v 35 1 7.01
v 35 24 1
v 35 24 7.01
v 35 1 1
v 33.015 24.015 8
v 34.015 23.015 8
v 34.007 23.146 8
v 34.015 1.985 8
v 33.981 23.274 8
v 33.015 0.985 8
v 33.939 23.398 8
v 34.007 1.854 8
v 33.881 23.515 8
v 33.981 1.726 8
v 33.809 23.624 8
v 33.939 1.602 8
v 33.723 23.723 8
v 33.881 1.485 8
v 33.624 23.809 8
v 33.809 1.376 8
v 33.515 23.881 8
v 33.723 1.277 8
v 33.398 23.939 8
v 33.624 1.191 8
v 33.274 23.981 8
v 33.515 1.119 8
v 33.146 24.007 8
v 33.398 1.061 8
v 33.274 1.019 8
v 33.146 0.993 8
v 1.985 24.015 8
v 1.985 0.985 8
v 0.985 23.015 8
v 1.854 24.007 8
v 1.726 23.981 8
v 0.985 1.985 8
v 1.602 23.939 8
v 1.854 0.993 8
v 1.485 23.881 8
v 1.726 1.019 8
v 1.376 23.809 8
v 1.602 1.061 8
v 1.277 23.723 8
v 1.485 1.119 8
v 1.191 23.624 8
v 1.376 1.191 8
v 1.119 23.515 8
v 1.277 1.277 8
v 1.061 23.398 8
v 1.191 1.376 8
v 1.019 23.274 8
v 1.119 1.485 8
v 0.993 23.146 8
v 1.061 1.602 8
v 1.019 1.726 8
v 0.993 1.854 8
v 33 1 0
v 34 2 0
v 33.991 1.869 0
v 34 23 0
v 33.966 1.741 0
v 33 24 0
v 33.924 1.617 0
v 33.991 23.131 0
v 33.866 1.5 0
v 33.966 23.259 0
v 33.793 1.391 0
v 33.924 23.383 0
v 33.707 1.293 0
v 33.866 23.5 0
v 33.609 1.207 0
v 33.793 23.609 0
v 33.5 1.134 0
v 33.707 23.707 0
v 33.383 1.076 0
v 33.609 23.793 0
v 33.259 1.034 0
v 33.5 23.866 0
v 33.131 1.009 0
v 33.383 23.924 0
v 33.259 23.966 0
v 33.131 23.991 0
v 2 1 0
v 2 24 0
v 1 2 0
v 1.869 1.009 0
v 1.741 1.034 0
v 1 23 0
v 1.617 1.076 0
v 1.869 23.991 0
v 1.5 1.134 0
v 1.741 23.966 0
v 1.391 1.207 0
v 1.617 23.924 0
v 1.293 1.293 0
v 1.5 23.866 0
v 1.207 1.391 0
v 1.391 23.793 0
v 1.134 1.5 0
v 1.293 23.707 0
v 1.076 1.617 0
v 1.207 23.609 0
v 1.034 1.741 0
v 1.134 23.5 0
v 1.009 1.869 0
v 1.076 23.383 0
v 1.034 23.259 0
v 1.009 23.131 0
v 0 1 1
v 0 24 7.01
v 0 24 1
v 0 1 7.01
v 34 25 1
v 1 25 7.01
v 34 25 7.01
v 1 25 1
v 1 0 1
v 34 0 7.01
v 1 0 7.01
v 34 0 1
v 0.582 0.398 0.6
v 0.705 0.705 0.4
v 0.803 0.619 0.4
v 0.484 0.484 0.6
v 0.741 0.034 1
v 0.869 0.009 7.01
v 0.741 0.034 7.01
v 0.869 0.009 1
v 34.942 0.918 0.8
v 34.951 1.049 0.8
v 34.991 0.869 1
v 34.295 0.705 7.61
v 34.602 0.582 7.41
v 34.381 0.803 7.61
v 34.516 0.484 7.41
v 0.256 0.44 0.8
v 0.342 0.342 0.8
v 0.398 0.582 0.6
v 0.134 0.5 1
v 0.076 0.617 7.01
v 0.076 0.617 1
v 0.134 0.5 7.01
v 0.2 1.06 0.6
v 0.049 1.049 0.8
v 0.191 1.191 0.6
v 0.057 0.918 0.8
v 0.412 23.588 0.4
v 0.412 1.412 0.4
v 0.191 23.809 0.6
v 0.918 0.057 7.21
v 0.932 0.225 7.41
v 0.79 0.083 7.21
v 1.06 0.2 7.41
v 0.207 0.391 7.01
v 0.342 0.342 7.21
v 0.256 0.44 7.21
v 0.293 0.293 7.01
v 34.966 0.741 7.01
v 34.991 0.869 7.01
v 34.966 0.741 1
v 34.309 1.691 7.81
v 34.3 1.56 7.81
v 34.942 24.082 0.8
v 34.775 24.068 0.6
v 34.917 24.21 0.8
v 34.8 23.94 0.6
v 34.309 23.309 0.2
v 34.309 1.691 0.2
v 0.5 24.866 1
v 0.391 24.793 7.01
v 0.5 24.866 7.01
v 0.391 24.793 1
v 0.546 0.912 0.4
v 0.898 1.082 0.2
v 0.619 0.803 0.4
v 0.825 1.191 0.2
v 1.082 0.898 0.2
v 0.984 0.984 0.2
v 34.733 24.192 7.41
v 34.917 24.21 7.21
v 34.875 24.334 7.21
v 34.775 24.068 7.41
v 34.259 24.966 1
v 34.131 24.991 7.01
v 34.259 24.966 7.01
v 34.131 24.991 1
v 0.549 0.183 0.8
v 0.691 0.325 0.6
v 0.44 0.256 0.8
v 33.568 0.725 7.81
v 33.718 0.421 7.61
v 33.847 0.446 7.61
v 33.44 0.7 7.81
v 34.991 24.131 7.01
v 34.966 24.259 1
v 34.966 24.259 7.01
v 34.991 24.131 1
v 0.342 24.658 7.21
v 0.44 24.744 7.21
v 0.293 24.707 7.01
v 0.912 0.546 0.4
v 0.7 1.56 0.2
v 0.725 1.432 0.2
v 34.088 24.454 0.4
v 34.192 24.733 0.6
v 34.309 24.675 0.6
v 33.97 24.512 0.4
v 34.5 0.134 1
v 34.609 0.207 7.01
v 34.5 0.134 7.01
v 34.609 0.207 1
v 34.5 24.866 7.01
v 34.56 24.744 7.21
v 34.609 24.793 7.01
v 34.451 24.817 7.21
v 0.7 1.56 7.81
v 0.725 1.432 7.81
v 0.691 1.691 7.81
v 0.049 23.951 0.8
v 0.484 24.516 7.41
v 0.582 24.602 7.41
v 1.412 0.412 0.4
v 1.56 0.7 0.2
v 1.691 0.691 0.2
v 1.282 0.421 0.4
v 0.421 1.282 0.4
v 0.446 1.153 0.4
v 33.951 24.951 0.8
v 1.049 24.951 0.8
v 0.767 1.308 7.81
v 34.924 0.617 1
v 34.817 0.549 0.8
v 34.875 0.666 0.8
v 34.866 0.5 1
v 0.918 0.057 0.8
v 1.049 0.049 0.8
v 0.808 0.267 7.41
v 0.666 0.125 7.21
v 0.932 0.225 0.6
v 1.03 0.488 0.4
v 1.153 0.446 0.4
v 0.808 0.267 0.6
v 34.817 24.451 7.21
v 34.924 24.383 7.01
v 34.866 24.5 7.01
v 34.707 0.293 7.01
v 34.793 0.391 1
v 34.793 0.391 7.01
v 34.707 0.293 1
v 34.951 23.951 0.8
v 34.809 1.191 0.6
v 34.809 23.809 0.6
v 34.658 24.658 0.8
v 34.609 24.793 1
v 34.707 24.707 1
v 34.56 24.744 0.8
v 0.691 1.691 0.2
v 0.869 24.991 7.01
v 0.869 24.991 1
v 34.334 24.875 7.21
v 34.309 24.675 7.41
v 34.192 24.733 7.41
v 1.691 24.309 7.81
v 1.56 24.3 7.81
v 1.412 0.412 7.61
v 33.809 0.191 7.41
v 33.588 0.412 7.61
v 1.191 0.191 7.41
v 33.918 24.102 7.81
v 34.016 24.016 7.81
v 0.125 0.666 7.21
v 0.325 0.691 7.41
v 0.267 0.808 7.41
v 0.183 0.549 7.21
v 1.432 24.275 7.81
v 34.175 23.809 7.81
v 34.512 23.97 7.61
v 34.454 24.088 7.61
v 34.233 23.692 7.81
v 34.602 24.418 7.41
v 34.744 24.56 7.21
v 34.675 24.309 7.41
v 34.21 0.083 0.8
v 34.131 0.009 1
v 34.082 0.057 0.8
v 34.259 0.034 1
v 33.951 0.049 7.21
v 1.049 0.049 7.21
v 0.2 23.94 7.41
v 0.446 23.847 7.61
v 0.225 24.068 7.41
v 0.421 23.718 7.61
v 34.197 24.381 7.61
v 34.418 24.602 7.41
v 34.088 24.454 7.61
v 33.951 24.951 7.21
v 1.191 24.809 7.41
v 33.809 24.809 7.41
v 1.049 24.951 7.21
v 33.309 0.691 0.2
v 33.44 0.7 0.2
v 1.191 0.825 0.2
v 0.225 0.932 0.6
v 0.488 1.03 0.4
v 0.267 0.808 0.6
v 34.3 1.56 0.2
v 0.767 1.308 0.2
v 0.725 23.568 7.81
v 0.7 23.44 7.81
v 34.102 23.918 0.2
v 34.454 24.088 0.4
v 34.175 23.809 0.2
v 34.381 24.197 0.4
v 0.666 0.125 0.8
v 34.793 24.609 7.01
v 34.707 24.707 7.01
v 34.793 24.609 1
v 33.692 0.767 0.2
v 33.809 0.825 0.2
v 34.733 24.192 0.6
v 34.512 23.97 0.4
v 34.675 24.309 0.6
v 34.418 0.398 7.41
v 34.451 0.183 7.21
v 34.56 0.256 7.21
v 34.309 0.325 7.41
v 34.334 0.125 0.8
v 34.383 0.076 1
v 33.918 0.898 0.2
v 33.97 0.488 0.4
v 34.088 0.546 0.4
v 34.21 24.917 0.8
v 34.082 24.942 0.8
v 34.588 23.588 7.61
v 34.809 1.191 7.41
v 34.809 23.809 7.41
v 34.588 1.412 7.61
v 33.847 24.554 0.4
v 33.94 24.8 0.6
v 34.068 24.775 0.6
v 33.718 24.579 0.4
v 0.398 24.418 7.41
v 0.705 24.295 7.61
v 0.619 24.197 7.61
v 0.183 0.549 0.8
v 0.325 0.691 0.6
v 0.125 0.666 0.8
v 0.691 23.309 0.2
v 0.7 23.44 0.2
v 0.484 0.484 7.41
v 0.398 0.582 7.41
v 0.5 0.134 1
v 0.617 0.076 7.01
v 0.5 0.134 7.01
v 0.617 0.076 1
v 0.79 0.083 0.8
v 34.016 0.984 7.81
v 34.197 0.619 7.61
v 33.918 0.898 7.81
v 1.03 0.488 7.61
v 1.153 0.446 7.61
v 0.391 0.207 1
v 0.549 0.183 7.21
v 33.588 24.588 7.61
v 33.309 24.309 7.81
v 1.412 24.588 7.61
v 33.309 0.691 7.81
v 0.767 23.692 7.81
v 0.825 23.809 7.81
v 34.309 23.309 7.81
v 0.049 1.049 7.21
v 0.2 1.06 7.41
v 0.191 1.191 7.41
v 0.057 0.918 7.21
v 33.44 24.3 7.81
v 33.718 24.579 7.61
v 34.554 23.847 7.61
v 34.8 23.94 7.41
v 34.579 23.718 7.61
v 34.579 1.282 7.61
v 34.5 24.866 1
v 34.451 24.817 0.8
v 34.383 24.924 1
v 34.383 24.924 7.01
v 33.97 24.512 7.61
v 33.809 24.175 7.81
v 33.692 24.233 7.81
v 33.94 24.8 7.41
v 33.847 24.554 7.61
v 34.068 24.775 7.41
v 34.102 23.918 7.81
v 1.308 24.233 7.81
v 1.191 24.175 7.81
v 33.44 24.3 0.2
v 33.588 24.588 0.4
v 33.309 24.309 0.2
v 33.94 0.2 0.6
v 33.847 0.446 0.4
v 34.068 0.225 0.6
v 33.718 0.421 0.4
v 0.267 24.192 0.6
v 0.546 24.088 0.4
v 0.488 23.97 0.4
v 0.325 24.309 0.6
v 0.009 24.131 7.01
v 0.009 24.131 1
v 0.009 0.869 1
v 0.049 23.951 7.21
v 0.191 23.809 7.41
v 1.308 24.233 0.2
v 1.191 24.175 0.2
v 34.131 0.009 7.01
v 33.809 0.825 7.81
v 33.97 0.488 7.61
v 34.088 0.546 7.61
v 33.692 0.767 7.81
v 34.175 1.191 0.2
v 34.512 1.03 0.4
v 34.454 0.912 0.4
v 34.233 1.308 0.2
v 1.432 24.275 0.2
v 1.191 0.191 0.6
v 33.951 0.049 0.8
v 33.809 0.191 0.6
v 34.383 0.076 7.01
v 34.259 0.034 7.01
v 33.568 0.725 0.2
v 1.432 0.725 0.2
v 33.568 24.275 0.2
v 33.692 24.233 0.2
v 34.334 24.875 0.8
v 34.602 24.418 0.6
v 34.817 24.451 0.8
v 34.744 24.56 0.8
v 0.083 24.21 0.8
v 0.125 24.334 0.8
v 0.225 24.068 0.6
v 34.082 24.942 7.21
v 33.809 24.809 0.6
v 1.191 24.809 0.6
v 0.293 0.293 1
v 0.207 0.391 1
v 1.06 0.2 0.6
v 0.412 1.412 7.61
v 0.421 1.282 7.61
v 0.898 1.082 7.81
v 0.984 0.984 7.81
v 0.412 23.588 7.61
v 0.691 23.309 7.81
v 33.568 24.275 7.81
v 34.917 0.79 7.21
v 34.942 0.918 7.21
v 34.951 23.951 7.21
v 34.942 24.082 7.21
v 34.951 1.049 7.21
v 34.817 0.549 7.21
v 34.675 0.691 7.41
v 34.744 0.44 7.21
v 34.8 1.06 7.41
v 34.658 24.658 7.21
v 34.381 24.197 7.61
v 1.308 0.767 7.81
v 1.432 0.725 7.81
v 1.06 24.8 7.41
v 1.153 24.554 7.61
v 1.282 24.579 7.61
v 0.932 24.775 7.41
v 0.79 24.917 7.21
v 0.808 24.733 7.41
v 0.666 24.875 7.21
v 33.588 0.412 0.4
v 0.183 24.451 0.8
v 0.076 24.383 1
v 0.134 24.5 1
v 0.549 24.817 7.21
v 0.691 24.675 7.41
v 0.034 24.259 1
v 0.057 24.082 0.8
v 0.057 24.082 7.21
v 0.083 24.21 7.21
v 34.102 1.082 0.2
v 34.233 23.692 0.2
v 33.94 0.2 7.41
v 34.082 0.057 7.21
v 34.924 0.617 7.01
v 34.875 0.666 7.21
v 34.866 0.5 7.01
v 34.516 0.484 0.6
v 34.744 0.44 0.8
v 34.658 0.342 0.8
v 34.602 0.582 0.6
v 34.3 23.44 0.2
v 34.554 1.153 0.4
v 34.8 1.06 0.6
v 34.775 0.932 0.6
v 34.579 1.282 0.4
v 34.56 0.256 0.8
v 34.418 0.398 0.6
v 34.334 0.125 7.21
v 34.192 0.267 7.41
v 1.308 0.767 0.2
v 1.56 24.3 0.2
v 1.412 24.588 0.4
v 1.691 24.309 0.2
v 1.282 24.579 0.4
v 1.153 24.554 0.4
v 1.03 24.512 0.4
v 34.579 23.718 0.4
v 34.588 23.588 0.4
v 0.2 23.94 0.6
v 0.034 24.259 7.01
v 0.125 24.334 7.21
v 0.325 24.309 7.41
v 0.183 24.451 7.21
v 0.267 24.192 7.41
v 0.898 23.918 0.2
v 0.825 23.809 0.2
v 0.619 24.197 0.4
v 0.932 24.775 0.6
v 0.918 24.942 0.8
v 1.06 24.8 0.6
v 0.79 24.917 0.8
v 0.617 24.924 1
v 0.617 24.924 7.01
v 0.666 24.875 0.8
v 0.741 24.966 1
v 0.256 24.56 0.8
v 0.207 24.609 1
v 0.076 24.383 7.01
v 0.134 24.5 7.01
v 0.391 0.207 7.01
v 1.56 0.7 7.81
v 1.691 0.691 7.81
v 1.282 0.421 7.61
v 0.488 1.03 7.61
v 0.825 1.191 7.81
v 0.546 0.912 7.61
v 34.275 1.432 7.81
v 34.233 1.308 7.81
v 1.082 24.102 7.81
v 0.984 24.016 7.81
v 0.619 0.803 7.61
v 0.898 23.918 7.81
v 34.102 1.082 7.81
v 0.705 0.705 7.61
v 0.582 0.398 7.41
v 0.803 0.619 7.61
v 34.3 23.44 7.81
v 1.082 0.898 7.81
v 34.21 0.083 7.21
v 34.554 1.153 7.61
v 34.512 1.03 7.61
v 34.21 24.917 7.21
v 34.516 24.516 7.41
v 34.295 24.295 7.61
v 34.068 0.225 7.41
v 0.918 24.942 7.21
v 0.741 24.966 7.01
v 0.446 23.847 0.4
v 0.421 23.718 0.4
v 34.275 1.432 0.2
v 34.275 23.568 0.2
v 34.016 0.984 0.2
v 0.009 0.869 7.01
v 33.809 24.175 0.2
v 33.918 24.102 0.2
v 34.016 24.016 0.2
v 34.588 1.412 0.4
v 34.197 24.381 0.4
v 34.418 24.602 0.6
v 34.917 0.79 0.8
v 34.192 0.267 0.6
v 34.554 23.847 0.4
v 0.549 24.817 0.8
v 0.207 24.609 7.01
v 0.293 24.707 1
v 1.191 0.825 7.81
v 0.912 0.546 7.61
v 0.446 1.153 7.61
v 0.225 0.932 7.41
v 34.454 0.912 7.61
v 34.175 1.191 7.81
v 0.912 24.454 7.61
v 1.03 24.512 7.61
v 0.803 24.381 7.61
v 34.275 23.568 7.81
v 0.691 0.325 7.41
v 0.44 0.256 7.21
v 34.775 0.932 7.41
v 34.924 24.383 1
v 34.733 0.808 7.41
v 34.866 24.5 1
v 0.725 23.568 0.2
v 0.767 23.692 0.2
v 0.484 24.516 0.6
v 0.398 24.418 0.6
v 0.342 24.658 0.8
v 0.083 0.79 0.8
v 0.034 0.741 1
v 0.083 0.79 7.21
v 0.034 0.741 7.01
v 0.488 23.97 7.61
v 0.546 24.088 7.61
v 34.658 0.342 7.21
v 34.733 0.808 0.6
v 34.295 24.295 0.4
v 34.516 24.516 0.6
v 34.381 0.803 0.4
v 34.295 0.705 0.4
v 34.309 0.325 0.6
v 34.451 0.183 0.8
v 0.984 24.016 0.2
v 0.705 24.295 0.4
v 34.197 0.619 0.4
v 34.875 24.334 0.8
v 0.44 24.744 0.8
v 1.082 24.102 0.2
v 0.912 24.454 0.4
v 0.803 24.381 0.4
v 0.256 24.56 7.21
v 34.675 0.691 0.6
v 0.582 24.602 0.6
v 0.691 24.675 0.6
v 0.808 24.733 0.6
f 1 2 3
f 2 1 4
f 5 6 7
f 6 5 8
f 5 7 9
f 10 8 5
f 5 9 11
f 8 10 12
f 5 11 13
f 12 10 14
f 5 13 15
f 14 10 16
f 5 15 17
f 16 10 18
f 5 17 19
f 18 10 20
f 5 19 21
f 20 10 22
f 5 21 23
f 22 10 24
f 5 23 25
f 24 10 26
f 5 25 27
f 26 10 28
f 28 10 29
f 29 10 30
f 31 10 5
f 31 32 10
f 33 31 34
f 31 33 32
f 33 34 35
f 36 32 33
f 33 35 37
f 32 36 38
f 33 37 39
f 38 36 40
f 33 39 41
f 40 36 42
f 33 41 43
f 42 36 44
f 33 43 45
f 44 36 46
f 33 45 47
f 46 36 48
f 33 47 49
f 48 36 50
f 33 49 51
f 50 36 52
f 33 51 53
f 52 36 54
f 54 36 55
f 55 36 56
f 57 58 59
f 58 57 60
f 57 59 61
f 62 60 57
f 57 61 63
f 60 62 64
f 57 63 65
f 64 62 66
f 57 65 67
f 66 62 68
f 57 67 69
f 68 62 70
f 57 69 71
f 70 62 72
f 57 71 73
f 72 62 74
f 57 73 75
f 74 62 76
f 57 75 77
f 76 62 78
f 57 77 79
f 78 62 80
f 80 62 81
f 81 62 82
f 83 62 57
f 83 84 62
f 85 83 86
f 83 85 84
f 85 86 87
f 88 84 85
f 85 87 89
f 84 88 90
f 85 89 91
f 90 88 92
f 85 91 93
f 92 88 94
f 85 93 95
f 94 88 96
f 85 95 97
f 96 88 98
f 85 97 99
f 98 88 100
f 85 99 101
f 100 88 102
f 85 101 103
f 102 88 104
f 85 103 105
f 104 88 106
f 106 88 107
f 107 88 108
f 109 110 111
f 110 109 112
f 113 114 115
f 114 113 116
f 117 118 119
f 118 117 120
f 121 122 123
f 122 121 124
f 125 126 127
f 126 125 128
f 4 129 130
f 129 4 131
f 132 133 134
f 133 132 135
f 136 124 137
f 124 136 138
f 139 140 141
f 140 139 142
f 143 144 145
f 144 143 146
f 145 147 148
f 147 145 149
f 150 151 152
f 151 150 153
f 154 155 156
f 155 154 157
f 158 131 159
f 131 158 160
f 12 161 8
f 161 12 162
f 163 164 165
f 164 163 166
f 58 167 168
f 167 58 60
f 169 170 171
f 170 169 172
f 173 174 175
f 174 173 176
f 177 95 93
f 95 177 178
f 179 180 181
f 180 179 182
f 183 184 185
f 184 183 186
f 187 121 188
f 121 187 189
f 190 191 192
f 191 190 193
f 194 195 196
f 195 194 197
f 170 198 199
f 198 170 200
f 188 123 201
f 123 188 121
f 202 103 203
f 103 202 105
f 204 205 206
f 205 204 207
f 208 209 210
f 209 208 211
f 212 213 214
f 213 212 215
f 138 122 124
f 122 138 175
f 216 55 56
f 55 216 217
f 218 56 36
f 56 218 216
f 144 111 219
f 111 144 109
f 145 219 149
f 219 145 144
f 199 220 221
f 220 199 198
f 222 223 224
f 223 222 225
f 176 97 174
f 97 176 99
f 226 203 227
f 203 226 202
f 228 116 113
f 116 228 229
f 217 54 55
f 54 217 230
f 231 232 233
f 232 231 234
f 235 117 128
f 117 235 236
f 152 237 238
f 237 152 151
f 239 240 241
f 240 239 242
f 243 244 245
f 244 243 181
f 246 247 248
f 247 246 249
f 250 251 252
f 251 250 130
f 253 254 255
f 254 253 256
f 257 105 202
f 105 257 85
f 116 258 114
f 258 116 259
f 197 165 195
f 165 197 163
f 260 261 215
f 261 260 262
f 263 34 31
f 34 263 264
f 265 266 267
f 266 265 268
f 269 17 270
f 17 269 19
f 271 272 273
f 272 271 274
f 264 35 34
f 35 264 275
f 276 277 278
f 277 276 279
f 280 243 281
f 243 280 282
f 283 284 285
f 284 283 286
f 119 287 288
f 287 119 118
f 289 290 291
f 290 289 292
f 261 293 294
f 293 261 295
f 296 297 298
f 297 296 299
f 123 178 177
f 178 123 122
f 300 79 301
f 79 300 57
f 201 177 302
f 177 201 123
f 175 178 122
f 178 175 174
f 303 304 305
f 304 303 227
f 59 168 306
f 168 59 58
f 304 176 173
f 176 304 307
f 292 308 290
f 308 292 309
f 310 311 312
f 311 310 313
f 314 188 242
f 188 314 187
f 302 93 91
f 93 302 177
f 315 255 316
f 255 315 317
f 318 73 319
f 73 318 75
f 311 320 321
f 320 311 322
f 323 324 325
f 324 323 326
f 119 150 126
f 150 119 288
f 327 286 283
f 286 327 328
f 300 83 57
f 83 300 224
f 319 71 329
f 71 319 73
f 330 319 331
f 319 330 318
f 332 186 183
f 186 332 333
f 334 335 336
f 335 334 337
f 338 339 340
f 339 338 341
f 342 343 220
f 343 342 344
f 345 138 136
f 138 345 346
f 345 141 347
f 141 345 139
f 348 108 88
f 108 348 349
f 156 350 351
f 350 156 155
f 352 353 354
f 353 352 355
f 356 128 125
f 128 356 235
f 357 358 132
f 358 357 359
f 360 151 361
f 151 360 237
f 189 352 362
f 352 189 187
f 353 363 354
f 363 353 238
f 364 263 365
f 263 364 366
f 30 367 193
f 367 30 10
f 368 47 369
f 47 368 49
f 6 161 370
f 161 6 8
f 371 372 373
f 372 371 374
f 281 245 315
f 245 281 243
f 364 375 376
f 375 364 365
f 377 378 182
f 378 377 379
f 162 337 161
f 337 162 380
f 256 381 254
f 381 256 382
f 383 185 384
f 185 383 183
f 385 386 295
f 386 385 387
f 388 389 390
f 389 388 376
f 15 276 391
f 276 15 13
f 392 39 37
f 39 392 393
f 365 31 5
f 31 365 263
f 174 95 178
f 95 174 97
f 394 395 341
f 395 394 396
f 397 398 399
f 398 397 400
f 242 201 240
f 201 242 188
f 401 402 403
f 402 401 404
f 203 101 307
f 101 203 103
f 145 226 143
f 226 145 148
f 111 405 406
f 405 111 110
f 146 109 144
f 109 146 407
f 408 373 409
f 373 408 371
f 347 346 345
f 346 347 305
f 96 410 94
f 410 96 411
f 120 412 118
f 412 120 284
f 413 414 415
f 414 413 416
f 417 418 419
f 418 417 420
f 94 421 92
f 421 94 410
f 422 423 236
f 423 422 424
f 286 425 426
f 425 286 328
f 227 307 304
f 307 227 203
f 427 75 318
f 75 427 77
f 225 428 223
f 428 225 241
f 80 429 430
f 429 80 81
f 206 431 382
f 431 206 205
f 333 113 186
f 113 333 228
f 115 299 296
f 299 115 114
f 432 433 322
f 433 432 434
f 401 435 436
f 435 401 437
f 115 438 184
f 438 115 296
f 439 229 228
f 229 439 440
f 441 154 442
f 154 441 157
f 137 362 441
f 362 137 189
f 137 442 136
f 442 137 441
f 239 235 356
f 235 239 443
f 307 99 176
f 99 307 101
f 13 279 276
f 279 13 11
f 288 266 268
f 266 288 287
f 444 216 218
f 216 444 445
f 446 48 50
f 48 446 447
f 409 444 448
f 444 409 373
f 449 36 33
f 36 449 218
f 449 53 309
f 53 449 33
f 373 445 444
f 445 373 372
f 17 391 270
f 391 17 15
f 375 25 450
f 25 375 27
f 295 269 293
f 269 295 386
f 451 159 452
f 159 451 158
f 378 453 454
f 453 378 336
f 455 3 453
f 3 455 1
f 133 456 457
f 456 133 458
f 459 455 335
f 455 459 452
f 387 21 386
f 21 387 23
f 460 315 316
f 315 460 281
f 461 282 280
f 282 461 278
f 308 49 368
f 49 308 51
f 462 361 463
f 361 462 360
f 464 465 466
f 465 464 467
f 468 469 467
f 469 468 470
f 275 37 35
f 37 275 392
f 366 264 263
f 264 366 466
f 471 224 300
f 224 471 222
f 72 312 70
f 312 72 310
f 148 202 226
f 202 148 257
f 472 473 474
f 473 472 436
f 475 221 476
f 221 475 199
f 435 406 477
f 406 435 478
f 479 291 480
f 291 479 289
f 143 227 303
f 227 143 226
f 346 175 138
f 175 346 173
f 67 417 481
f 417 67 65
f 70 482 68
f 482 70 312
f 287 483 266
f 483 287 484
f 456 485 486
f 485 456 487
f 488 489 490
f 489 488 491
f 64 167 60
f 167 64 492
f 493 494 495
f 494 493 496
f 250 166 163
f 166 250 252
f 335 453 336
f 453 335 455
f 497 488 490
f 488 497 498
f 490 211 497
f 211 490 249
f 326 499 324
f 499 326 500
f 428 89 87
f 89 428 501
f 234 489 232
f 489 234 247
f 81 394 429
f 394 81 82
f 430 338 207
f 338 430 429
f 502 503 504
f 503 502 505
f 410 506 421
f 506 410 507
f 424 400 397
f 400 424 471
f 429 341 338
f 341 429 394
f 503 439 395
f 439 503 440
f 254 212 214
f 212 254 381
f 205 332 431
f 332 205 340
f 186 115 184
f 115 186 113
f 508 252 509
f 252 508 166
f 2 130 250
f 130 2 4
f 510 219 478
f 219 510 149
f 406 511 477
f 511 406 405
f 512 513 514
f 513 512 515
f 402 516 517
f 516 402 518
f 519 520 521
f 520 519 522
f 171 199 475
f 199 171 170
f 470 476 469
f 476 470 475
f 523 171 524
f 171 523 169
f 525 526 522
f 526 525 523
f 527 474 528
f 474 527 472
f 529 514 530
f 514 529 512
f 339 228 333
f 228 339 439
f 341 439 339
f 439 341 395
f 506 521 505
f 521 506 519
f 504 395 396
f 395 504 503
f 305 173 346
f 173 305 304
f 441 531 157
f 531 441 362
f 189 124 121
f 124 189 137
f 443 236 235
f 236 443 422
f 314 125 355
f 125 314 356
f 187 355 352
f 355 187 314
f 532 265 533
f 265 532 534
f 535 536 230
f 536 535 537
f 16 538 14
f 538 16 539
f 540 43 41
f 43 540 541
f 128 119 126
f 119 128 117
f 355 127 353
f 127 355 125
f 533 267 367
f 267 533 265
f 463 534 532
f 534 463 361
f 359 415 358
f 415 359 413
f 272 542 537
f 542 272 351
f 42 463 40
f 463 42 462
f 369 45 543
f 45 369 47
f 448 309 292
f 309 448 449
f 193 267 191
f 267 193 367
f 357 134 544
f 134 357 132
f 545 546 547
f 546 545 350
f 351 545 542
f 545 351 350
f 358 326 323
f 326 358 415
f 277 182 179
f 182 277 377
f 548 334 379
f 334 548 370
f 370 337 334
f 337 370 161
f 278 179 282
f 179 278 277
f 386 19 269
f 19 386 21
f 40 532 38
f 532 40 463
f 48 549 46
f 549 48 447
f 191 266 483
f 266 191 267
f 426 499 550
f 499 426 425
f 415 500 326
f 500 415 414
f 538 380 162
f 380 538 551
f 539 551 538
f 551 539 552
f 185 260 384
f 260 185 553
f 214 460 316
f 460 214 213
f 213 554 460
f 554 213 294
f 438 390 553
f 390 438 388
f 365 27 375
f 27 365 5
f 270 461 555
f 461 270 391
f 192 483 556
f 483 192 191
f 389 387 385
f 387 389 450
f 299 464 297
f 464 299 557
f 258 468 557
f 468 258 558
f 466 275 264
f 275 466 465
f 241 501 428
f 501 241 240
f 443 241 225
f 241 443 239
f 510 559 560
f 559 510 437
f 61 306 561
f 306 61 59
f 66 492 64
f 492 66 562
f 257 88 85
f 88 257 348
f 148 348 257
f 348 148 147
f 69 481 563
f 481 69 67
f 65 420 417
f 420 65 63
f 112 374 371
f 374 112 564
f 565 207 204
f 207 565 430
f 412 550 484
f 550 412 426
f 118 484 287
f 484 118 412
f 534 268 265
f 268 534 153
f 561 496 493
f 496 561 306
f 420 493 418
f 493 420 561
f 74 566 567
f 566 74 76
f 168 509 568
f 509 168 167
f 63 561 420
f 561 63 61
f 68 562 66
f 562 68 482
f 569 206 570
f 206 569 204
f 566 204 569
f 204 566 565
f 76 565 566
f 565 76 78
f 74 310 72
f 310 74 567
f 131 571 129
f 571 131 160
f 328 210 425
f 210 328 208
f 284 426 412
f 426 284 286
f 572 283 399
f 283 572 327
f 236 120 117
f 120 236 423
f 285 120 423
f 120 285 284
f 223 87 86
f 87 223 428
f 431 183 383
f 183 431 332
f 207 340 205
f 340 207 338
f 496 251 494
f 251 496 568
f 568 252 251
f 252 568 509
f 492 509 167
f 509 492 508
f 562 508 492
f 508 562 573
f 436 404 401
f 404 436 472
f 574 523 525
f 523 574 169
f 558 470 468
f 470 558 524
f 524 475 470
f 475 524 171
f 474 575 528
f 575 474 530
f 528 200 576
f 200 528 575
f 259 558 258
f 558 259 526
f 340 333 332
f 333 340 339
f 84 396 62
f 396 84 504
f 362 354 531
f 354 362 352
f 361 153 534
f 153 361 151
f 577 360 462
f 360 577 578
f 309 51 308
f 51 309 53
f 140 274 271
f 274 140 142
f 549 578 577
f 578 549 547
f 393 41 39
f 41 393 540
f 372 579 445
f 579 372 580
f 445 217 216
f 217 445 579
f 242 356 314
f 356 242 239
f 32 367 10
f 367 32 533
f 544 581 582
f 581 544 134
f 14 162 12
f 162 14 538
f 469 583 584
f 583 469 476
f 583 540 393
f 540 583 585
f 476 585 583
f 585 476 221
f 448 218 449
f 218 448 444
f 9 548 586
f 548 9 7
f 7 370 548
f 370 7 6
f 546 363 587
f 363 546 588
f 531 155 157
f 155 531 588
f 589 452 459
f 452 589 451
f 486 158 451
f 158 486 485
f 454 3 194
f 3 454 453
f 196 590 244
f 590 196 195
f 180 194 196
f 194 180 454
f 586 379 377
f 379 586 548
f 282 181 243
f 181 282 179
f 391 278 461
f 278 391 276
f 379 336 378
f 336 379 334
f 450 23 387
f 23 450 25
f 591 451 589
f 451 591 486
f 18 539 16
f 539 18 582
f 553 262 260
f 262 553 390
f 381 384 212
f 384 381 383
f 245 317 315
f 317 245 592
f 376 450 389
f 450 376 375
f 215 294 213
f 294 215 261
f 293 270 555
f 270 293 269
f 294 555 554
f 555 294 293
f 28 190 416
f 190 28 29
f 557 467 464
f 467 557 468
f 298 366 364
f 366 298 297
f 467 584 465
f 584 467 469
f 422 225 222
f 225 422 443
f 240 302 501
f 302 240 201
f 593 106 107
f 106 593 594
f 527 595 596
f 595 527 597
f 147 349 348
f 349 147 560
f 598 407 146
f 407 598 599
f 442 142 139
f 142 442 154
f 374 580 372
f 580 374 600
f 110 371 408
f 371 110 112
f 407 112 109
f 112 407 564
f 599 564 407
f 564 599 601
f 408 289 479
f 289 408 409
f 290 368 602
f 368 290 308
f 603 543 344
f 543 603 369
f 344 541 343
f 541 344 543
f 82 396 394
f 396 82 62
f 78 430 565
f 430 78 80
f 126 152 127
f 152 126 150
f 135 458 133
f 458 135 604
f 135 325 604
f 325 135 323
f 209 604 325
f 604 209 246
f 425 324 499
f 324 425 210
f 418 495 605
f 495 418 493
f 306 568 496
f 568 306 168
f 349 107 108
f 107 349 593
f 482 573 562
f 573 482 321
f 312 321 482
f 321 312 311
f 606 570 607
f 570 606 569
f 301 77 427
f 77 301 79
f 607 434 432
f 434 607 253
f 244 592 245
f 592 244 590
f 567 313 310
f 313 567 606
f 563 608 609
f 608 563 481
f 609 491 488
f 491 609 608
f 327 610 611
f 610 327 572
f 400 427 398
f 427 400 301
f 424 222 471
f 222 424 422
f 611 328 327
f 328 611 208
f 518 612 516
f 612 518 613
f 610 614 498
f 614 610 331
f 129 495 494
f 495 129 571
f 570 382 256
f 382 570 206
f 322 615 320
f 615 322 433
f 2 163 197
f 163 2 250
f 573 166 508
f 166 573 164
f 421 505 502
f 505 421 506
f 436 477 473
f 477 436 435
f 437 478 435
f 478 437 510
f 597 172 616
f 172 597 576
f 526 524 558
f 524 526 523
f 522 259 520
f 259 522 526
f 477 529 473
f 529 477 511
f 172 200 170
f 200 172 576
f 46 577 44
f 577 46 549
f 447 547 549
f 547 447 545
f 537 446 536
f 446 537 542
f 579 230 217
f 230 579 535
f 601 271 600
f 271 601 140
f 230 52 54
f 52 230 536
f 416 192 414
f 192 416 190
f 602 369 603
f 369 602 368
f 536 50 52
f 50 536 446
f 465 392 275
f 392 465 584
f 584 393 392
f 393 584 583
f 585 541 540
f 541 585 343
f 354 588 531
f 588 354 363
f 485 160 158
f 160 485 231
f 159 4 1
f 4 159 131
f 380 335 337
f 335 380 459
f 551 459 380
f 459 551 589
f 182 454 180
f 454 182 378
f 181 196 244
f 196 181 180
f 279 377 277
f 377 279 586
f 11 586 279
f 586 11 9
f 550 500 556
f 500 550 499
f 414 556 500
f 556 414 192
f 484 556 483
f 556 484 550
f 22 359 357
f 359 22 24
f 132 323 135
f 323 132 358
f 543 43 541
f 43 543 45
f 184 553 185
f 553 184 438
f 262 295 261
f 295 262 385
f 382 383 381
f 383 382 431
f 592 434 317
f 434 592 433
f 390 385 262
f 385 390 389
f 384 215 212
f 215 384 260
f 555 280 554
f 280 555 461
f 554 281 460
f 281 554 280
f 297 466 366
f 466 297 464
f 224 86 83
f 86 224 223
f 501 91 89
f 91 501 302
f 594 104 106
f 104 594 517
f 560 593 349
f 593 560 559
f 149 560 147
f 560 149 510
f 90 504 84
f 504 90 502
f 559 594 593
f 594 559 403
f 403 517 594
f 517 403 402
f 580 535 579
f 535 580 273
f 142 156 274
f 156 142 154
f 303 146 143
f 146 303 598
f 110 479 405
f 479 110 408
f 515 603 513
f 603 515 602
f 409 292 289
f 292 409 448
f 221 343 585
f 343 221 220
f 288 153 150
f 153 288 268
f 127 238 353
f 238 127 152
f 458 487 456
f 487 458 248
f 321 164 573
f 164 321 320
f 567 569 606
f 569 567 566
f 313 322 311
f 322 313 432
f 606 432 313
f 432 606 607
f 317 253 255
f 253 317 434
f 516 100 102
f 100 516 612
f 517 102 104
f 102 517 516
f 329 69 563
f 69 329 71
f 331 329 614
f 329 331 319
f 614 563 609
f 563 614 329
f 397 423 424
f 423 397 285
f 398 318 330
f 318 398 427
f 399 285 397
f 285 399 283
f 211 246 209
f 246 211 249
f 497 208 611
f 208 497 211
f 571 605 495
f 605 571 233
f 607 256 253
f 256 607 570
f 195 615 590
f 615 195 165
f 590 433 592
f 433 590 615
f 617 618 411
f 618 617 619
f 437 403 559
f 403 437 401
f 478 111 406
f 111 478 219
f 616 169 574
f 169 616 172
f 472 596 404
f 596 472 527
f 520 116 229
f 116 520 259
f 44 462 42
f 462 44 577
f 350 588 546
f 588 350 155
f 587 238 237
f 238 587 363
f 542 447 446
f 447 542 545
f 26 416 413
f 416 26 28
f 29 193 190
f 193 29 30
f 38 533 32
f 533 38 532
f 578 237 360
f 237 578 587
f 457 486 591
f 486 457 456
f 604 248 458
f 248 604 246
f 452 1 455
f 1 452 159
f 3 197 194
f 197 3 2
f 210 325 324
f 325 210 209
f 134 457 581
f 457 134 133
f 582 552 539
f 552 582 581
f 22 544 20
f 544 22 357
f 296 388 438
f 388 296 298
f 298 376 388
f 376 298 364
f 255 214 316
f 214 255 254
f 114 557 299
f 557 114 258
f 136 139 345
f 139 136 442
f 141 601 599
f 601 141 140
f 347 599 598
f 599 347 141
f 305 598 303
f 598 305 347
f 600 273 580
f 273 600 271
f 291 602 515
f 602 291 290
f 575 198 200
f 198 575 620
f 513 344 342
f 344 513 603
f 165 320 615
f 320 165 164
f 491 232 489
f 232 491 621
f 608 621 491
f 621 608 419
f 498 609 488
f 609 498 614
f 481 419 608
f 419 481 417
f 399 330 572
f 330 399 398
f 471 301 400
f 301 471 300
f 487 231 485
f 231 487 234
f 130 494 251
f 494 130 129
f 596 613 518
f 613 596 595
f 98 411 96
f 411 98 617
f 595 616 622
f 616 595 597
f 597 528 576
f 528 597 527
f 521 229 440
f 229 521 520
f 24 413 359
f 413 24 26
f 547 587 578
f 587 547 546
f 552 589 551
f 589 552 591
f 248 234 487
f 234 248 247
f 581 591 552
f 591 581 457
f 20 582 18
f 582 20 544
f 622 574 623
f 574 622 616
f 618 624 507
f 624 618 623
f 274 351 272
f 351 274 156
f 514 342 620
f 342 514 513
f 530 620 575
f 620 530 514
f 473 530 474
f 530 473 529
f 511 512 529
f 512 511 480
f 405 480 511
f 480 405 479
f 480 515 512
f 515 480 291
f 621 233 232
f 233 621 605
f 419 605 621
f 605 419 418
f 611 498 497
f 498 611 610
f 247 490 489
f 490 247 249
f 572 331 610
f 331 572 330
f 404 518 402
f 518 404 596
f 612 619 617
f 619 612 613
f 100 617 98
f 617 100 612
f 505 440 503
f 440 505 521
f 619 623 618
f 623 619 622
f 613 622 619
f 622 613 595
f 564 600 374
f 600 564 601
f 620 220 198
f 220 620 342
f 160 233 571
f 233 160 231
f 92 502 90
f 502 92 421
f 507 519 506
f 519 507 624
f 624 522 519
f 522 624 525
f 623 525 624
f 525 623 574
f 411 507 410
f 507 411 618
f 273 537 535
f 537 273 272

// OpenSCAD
// units=mm — generated by scad_emitter.py
// part=unnamed
$fn = 48;

intersection() { cube([35, 25, 8]); hull() { translate([2, 2, 0]) linear_extrude(height=0.01) offset(r=1) square([31, 21]); translate([1.691, 1.691, 0.2]) linear_extrude(height=0.01) offset(r=1) square([31.618, 21.618]); translate([1.4122, 1.4122, 0.4]) linear_extrude(height=0.01) offset(r=1) square([32.1756, 22.1756]); translate([1.191, 1.191, 0.6]) linear_extrude(height=0.01) offset(r=1) square([32.618, 22.618]); translate([1.0489, 1.0489, 0.8]) linear_extrude(height=0.01) offset(r=1) square([32.9021, 22.9021]); translate([1, 1, 1]) linear_extrude(height=0.01) offset(r=1) square([33, 23]); translate([2, 2, 8]) linear_extrude(height=0.01) offset(r=1) square([31, 21]); translate([1.691, 1.691, 7.8]) linear_extrude(height=0.01) offset(r=1) square([31.618, 21.618]); translate([1.4122, 1.4122, 7.6]) linear_extrude(height=0.01) offset(r=1) square([32.1756, 22.1756]); translate([1.191, 1.191, 7.4]) linear_extrude(height=0.01) offset(r=1) square([32.618, 22.618]); translate([1.0489, 1.0489, 7.2]) linear_extrude(height=0.01) offset(r=1) square([32.9021, 22.9021]); translate([1, 1, 7]) linear_extrude(height=0.01) offset(r=1) square([33, 23]); } }
